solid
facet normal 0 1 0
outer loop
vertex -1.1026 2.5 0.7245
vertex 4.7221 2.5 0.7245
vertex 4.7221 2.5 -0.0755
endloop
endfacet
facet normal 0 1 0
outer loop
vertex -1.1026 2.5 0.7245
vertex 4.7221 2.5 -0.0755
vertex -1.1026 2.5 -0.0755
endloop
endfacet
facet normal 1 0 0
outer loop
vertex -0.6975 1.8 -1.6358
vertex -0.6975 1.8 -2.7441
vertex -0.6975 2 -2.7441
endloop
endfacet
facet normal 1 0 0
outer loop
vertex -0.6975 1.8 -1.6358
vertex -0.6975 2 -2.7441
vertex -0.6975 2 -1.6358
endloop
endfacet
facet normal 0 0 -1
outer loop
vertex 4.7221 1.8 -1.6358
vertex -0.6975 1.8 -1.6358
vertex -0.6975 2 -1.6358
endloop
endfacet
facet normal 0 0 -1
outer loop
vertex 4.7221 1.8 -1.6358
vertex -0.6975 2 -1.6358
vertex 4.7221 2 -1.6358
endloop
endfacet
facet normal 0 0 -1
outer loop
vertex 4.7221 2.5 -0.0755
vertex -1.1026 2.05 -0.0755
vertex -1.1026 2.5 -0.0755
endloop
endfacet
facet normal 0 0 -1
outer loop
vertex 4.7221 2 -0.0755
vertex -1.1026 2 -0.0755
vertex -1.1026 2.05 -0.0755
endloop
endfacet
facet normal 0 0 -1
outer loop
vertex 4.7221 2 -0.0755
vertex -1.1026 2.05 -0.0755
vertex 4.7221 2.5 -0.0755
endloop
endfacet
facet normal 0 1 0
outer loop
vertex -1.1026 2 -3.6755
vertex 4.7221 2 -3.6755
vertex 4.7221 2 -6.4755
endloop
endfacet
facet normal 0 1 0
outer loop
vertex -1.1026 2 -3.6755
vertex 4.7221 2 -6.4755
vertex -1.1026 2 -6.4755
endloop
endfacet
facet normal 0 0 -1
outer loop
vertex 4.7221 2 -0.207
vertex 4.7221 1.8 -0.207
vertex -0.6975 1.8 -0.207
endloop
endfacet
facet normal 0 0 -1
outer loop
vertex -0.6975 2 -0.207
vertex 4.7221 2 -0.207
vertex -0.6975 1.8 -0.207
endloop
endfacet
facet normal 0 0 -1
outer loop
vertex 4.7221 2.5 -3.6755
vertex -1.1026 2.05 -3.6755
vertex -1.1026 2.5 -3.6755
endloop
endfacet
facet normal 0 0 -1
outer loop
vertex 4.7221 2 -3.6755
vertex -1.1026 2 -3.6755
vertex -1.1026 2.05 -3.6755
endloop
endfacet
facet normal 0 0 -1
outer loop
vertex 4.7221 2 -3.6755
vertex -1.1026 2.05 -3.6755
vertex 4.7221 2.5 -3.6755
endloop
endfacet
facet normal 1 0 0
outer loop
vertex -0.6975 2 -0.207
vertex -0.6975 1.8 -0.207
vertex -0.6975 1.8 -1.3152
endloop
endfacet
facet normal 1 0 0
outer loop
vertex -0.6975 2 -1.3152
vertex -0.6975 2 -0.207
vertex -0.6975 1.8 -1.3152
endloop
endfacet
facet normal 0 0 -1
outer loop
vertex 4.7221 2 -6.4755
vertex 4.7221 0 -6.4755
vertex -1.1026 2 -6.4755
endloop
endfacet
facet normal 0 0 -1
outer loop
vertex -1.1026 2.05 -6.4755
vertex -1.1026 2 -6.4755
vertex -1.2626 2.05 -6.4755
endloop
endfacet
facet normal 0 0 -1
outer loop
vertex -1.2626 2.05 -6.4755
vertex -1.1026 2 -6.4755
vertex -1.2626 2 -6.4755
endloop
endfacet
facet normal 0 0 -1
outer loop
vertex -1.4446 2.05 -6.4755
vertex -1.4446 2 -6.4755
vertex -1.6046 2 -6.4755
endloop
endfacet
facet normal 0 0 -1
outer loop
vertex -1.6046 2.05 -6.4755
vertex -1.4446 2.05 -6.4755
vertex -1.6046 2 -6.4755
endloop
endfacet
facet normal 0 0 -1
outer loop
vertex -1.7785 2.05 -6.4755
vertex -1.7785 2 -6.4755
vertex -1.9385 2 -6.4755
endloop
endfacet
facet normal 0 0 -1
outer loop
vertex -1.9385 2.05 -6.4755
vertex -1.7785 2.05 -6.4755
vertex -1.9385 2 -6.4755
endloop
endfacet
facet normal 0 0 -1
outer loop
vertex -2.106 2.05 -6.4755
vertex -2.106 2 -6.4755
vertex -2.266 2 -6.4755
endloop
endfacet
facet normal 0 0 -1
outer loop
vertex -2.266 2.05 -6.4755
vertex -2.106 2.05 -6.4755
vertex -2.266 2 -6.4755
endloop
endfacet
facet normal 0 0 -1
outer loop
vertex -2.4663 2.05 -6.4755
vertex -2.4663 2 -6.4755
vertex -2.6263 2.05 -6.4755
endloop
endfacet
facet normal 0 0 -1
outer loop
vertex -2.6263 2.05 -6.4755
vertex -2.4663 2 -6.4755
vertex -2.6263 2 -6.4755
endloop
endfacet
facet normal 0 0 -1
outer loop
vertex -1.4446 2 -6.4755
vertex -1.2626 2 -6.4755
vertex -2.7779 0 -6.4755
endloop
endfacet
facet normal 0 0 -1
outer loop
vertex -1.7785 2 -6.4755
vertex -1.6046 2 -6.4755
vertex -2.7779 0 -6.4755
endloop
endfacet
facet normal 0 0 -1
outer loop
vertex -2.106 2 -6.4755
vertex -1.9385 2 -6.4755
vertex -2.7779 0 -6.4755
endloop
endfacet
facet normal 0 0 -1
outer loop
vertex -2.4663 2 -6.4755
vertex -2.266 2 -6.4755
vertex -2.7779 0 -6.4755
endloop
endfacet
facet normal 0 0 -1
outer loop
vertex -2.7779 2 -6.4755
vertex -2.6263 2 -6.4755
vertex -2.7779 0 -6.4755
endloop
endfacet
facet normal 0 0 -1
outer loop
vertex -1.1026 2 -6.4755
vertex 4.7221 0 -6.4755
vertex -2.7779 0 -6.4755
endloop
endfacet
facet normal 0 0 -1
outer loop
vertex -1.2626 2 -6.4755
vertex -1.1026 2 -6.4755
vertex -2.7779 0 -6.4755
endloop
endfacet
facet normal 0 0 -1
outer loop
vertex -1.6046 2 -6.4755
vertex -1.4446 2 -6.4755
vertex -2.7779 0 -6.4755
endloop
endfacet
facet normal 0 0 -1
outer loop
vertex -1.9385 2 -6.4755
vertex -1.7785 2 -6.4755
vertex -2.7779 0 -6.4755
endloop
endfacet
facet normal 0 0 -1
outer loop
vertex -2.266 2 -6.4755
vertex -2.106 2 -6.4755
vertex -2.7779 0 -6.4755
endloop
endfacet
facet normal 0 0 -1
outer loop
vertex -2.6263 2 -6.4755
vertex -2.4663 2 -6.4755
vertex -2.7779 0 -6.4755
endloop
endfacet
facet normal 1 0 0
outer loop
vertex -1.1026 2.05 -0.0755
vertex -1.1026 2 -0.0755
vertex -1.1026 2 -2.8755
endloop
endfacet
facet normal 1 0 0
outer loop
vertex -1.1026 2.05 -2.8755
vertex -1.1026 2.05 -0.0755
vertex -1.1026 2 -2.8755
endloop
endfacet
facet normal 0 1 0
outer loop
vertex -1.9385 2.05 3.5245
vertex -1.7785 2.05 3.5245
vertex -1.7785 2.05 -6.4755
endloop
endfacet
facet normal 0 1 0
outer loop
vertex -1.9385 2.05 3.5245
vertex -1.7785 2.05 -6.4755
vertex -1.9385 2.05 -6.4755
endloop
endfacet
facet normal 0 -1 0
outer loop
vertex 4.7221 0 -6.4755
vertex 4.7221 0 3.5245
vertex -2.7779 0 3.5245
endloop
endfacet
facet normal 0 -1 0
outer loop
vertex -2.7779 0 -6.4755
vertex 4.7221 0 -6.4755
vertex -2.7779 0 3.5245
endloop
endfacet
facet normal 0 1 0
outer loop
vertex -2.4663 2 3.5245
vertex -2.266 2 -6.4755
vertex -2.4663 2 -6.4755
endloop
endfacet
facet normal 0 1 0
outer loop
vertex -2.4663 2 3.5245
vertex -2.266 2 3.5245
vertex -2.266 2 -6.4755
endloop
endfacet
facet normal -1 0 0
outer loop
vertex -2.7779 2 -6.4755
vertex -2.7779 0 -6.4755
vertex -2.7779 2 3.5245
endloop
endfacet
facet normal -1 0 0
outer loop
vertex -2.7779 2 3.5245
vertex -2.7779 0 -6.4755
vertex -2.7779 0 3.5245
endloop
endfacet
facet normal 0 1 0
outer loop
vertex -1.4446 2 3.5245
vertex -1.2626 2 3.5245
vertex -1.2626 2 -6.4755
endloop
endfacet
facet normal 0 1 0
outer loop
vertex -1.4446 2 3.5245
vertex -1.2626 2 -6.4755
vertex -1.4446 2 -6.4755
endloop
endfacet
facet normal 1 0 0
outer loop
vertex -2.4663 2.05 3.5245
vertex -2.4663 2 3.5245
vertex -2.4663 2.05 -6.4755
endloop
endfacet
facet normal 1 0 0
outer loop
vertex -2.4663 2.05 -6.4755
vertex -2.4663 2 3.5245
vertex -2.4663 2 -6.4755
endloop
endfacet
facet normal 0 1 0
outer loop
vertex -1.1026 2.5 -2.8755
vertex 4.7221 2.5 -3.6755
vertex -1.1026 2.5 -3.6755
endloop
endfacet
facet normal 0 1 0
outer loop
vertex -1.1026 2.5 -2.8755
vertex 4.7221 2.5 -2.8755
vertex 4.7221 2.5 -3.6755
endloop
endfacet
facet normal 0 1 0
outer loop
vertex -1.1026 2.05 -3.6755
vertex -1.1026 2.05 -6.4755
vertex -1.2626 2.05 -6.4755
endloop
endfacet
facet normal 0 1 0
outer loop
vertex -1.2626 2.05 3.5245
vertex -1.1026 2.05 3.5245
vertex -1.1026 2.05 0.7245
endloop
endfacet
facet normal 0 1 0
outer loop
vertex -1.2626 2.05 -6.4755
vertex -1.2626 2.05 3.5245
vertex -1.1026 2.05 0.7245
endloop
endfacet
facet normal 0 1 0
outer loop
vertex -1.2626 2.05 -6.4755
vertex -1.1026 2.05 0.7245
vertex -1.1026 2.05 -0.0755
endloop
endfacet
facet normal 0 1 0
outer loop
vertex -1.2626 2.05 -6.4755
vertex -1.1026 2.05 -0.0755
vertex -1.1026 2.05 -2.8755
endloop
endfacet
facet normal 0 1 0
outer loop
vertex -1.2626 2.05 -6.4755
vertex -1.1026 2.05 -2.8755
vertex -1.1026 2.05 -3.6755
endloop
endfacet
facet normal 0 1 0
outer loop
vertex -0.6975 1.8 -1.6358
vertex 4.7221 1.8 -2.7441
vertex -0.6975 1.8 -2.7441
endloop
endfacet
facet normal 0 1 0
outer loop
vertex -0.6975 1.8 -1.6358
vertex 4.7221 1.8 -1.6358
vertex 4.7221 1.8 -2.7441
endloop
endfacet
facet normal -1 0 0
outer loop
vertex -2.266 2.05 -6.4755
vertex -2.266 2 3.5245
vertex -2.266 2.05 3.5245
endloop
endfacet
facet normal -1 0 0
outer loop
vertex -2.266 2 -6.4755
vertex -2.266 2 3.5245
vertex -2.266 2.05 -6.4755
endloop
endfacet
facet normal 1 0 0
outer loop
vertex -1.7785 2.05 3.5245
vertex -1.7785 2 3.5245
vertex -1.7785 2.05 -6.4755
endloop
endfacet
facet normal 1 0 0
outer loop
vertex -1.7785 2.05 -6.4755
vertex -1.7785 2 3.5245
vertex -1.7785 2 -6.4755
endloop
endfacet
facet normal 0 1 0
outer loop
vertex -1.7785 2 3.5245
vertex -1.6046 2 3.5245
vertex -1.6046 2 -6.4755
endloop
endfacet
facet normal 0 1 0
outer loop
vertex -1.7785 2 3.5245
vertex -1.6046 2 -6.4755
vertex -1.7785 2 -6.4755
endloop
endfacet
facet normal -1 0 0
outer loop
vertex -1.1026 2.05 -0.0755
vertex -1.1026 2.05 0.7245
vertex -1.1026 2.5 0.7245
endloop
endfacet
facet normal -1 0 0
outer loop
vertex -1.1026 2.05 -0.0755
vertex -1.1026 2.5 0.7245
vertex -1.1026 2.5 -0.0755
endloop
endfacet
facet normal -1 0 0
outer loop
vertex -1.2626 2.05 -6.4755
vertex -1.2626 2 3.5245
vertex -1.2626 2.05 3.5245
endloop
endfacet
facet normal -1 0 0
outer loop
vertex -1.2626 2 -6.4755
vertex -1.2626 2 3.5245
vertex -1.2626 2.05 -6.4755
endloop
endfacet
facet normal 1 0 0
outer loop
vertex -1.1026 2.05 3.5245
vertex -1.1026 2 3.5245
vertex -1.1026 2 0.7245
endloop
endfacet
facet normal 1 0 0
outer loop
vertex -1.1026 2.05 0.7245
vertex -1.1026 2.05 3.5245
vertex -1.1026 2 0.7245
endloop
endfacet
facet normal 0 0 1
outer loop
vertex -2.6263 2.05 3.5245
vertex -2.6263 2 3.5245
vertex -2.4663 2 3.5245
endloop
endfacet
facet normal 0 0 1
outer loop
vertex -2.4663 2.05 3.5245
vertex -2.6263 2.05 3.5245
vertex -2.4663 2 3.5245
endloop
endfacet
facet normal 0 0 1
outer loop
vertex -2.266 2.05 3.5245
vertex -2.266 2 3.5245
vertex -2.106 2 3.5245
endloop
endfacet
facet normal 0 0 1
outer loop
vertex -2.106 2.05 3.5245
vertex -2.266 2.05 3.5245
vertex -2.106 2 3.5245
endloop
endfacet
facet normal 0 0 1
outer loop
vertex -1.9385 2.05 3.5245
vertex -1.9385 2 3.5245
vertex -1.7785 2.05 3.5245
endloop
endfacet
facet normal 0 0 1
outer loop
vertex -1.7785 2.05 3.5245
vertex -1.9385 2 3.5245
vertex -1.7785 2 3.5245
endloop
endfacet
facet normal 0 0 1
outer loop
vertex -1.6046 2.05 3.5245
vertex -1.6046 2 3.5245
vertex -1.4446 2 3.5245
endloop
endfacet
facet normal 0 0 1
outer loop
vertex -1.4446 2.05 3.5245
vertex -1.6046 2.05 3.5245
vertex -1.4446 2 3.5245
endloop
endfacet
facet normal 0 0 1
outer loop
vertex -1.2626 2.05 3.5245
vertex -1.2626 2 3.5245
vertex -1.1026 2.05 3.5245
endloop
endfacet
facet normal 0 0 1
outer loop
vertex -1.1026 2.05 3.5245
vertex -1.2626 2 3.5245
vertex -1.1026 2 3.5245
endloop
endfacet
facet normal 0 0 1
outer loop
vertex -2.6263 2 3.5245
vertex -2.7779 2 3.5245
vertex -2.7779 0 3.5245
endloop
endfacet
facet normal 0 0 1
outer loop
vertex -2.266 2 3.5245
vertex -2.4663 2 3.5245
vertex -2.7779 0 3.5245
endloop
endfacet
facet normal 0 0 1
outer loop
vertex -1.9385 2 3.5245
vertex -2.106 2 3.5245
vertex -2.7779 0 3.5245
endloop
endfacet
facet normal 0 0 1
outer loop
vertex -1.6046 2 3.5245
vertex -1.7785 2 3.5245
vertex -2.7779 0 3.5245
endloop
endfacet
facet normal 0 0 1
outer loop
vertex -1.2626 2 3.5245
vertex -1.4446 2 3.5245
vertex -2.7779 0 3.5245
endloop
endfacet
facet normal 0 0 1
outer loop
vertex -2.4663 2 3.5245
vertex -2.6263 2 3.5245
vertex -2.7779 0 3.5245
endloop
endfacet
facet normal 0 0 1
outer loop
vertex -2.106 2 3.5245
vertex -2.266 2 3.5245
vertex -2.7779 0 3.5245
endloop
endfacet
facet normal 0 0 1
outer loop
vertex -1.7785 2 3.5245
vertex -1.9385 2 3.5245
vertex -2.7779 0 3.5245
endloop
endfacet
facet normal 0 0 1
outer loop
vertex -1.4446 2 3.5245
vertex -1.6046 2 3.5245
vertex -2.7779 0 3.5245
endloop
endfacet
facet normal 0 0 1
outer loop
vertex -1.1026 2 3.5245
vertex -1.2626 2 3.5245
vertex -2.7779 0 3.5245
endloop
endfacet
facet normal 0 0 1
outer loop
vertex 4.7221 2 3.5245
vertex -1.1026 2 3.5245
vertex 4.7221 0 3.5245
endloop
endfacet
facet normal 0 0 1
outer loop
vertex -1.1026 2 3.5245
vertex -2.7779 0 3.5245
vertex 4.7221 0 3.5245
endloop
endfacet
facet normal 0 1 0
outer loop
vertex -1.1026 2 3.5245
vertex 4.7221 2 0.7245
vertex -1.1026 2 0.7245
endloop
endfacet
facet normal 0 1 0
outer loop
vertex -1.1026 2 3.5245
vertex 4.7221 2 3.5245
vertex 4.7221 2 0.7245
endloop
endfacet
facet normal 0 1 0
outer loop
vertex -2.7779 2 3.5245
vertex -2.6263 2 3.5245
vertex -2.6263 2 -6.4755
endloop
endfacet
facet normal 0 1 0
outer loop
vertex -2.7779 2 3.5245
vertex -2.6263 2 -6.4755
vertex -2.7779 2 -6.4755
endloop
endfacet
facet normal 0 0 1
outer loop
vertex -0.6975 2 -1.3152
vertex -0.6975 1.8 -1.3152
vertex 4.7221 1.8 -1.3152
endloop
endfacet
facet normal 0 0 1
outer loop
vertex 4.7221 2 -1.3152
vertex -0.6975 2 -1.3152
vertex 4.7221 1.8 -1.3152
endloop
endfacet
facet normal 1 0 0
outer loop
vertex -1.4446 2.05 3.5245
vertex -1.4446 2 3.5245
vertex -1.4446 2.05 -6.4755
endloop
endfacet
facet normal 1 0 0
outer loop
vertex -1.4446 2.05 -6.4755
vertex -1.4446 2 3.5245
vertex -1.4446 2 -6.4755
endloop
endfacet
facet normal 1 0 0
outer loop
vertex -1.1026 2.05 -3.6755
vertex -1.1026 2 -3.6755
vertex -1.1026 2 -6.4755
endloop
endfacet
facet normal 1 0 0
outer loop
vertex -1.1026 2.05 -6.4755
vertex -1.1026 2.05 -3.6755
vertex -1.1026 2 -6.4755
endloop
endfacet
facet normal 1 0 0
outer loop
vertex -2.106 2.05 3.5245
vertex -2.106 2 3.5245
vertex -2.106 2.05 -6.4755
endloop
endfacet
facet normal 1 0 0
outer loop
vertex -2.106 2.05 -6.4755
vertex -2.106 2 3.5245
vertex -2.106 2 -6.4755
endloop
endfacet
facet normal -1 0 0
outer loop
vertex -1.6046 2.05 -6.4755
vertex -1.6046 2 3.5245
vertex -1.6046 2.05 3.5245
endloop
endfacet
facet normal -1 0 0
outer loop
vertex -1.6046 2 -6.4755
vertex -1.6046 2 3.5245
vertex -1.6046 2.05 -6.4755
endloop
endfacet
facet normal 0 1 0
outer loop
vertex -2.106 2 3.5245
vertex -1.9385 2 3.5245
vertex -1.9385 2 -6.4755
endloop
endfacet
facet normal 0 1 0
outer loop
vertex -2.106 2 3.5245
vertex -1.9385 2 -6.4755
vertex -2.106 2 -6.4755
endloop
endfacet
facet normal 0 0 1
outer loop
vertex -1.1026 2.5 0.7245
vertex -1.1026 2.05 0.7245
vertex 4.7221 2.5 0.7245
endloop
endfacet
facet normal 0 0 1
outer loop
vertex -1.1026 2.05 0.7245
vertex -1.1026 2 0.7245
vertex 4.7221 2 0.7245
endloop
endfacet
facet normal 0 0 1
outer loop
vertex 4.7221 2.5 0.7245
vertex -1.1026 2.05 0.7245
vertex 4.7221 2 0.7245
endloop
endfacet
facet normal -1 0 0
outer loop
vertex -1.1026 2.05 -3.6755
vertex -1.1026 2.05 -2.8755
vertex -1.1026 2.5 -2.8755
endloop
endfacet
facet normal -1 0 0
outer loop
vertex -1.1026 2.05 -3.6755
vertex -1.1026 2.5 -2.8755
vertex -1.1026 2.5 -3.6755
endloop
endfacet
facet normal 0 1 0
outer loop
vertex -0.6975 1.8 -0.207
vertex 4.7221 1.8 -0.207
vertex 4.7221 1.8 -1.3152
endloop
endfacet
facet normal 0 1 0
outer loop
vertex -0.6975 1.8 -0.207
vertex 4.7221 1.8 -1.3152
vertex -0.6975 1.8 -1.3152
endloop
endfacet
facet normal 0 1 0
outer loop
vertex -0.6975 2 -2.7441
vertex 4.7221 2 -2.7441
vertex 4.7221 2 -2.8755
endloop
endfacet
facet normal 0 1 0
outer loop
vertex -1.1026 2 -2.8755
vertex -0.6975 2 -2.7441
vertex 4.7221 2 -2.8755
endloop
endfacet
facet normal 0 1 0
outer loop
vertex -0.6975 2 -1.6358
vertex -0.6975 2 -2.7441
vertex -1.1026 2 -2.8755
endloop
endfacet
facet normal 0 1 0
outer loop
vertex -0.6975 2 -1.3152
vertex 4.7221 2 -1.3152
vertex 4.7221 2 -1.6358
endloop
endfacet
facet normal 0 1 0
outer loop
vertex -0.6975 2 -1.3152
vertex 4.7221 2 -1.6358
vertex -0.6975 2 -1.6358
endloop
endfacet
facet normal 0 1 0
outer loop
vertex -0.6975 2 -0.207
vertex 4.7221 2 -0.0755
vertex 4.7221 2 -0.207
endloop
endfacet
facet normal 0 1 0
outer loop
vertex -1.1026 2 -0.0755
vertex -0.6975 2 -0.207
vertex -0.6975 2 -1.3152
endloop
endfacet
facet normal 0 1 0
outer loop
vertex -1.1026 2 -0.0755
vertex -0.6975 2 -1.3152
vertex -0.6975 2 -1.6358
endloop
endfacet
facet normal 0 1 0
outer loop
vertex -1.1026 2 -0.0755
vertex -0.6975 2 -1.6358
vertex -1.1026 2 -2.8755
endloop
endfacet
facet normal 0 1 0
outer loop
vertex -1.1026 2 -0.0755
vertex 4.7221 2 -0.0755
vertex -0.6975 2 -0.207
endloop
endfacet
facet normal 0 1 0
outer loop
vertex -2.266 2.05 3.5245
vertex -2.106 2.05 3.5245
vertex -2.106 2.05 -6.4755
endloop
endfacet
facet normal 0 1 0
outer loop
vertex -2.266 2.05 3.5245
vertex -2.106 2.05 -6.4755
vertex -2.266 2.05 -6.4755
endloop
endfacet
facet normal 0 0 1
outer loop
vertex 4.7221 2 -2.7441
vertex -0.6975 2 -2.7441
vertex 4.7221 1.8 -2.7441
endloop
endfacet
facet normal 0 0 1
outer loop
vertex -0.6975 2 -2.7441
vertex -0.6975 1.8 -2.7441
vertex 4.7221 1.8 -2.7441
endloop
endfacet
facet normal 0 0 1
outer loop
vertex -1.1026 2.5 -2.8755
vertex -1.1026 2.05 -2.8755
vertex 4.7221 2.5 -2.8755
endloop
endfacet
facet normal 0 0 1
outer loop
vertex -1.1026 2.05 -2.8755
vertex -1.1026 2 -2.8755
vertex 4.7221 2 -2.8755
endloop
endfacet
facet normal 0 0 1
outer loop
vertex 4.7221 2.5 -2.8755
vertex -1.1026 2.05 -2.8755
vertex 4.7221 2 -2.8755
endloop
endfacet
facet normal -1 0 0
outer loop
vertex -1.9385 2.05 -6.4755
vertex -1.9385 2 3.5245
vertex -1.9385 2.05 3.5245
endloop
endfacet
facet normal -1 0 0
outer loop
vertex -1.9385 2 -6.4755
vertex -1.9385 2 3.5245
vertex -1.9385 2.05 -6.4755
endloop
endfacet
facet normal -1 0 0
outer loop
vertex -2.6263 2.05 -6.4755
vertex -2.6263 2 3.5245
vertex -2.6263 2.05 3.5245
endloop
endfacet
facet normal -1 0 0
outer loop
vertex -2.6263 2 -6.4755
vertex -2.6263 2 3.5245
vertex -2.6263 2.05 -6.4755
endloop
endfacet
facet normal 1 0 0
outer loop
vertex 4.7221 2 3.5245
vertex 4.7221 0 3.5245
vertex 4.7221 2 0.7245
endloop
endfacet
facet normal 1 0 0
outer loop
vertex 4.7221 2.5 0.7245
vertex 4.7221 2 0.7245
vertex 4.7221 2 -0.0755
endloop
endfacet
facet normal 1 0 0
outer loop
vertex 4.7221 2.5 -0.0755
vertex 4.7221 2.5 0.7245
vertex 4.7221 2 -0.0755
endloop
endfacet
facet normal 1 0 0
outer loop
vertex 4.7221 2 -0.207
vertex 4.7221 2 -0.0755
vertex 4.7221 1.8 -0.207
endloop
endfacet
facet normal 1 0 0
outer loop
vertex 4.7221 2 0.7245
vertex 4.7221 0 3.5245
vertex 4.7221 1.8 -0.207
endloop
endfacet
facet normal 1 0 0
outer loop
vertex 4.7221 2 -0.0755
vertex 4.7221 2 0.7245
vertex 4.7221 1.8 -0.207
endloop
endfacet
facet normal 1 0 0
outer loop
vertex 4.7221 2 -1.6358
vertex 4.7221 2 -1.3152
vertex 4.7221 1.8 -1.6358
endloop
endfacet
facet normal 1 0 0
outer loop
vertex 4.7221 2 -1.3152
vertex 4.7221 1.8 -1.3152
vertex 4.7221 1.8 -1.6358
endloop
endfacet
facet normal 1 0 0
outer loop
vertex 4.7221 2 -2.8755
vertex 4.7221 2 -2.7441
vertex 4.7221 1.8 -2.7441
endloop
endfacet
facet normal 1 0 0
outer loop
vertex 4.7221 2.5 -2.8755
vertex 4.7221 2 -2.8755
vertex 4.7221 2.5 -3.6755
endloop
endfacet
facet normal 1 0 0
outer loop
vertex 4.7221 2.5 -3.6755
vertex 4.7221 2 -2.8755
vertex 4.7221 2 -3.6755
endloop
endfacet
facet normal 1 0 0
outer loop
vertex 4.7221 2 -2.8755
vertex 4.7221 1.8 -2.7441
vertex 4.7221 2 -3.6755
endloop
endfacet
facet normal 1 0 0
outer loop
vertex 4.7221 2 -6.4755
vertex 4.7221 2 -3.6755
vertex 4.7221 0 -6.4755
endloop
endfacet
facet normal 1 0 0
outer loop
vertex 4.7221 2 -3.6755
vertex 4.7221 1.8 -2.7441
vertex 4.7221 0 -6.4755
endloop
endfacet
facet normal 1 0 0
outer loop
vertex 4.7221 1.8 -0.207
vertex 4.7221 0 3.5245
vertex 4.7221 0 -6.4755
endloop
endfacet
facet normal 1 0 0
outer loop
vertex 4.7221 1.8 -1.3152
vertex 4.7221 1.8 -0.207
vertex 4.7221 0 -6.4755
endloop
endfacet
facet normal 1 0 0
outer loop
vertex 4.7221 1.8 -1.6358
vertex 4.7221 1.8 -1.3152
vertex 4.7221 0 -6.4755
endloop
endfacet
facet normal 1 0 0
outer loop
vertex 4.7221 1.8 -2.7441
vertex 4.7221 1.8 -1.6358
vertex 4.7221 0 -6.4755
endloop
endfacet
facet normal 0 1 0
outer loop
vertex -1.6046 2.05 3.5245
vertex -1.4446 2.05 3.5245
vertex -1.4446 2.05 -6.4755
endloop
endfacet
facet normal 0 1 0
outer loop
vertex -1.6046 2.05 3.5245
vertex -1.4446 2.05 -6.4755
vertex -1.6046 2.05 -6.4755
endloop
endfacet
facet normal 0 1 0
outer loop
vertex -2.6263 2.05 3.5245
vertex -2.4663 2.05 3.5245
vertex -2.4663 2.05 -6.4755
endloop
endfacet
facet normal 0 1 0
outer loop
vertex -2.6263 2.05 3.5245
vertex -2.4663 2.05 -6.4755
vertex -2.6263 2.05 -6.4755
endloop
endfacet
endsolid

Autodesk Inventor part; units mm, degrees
ref_plane "YZ Plane" through (0, 0, 0) normal (1, 0, 0) x (0, 1, 0)
ref_plane "XZ Plane" through (0, 0, 0) normal (0, 1, 0) x (-1, 0, 0)
ref_plane "XY Plane" through (0, 0, 0) normal (0, 0, 1) x (1, 0, 0)
sketch "草圖1" plane through (0, 0, 0) normal (0, 1, 0) x (-1, 0, 0)
  line L0 (2.7779, 3.5245) -> (-4.7221, 3.5245)
  line L1 (-4.7221, 3.5245) -> (-4.7221, -6.4755)
  line L2 (-4.7221, -6.4755) -> (2.7779, -6.4755)
  line L3 (2.7779, -6.4755) -> (2.7779, 3.5245)
  line L4 (1.1026, 3.5245) -> (1.1026, -6.4755)
  line L5 (1.1026, 0.7245) -> (-4.7221, 0.7245)
  line L6 (1.1026, -0.0755) -> (-4.7221, -0.0755)
  line L7 (1.1026, -2.8755) -> (-4.7221, -2.8755)
  line L8 (1.1026, -3.6755) -> (-4.7221, -3.6755)
  line L9 (1.1026, -1.4755) -> (-4.7221, -1.4755)
  line L10 (0.6975, -1.6358) -> (-3.8571, -1.6358)
  line L11 (-3.8571, -1.6358) -> (-3.8571, -2.7441)
  line L12 (-3.8571, -2.7441) -> (0.6975, -2.7441)
  line L13 (0.6975, -2.7441) -> (0.6975, -1.6358)
  line L14 (0.6975, -1.3152) -> (-3.8571, -1.3152)
  line L15 (-3.8571, -1.3152) -> (-3.8571, -0.207)
  line L16 (-3.8571, -0.207) -> (0.6975, -0.207)
  line L17 (0.6975, -0.207) -> (0.6975, -1.3152)
  line L18 (1.4446, 3.5245) -> (1.4446, -6.4755)
  line L19 (1.2626, 3.5245) -> (1.2626, -6.4755)
  line L20 (1.6046, 3.5245) -> (1.6046, -6.4755)
  line L21 (1.9385, 3.5245) -> (1.9385, -6.4755)
  line L22 (1.7785, 3.5245) -> (1.7785, -6.4755)
  line L23 (2.106, 3.5245) -> (2.106, -6.4755)
  line L24 (2.266, 3.5245) -> (2.266, -6.4755)
  line L25 (2.6263, 3.5245) -> (2.6263, -6.4755)
  line L26 (2.4663, 3.5245) -> (2.4663, -6.4755)
  line L27 (-3.8571, -0.207) -> (-3.8571, -1.3152)
  line L28 (-3.8571, -1.3152) -> (-4.7221, -1.3152)
  line L29 (-4.7221, -1.3152) -> (-4.7221, -0.207)
  line L30 (-4.7221, -0.207) -> (-3.8571, -0.207)
  line L31 (-3.8571, -1.6358) -> (-3.8571, -2.7441)
  line L32 (-3.8571, -2.7441) -> (-4.7221, -2.7441)
  line L33 (-4.7221, -2.7441) -> (-4.7221, -1.6358)
  line L34 (-4.7221, -1.6358) -> (-3.8571, -1.6358)
  line L35 (-3.8571, -0.207) -> (-3.8571, -1.3152)
  line L36 (-3.8571, -1.3152) -> (-4.7221, -1.3152)
  line L37 (-4.7221, -1.3152) -> (-4.7221, -0.207)
  line L38 (-4.7221, -0.207) -> (-3.8571, -0.207)
  line L39 (-3.8571, -1.6358) -> (-3.8571, -2.7441)
  line L40 (-3.8571, -2.7441) -> (-4.7221, -2.7441)
  line L41 (-4.7221, -2.7441) -> (-4.7221, -1.6358)
  line L42 (-4.7221, -1.6358) -> (-3.8571, -1.6358)
  point P0 (0, 0)
  dimension "d0" = 7.5
  dimension "d1" = 10
  dimension "d2" = 0.8
  dimension "d3" = 0.8
  dimension "d4" = 2.8
  dimension "d5" = 2.8
  dimension "d14" = 0.16
  dimension "d15" = 1.6753
  dimension "d16" = 0.16
  dimension "d17" = 0.16
  dimension "d18" = 0.16
  dimension "d19" = 0.16
extrude "擠出1" add sketch "草圖1" along normal blind 2 contours L3 L2 L25 L0 | L26 L2 L24 L0 | L23 L2 L21 L0 | L22 L2 L20 L0 | L18 L2 L19 L0 | L4 L5 L1 L0 | L2 L1 L8 L4
extrude "擠出2" add sketch "草圖1" along normal blind 2.5 contours L4 L6 L1 L5 | L8 L1 L7 L4
extrude "擠出3" add sketch "草圖1" along normal blind 2 contours L4 L9 L1 L28 L14 L17 L16 L30 L6 | L4 L7 L1 L32 L12 L13 L10 L34 L9
extrude "擠出4" add sketch "草圖1" along normal blind 1.8 contours L30 L15 L28 L1 | L16 L17 L14 L15 | L34 L11 L32 L1 | L10 L13 L12 L11
extrude "擠出5" add sketch "草圖1" along normal blind 2.05 contours L25 L2 L26 L0 | L24 L2 L23 L0 | L21 L2 L22 L0 | L20 L2 L18 L0 | L19 L2 L4 L0
properties part number "門"
